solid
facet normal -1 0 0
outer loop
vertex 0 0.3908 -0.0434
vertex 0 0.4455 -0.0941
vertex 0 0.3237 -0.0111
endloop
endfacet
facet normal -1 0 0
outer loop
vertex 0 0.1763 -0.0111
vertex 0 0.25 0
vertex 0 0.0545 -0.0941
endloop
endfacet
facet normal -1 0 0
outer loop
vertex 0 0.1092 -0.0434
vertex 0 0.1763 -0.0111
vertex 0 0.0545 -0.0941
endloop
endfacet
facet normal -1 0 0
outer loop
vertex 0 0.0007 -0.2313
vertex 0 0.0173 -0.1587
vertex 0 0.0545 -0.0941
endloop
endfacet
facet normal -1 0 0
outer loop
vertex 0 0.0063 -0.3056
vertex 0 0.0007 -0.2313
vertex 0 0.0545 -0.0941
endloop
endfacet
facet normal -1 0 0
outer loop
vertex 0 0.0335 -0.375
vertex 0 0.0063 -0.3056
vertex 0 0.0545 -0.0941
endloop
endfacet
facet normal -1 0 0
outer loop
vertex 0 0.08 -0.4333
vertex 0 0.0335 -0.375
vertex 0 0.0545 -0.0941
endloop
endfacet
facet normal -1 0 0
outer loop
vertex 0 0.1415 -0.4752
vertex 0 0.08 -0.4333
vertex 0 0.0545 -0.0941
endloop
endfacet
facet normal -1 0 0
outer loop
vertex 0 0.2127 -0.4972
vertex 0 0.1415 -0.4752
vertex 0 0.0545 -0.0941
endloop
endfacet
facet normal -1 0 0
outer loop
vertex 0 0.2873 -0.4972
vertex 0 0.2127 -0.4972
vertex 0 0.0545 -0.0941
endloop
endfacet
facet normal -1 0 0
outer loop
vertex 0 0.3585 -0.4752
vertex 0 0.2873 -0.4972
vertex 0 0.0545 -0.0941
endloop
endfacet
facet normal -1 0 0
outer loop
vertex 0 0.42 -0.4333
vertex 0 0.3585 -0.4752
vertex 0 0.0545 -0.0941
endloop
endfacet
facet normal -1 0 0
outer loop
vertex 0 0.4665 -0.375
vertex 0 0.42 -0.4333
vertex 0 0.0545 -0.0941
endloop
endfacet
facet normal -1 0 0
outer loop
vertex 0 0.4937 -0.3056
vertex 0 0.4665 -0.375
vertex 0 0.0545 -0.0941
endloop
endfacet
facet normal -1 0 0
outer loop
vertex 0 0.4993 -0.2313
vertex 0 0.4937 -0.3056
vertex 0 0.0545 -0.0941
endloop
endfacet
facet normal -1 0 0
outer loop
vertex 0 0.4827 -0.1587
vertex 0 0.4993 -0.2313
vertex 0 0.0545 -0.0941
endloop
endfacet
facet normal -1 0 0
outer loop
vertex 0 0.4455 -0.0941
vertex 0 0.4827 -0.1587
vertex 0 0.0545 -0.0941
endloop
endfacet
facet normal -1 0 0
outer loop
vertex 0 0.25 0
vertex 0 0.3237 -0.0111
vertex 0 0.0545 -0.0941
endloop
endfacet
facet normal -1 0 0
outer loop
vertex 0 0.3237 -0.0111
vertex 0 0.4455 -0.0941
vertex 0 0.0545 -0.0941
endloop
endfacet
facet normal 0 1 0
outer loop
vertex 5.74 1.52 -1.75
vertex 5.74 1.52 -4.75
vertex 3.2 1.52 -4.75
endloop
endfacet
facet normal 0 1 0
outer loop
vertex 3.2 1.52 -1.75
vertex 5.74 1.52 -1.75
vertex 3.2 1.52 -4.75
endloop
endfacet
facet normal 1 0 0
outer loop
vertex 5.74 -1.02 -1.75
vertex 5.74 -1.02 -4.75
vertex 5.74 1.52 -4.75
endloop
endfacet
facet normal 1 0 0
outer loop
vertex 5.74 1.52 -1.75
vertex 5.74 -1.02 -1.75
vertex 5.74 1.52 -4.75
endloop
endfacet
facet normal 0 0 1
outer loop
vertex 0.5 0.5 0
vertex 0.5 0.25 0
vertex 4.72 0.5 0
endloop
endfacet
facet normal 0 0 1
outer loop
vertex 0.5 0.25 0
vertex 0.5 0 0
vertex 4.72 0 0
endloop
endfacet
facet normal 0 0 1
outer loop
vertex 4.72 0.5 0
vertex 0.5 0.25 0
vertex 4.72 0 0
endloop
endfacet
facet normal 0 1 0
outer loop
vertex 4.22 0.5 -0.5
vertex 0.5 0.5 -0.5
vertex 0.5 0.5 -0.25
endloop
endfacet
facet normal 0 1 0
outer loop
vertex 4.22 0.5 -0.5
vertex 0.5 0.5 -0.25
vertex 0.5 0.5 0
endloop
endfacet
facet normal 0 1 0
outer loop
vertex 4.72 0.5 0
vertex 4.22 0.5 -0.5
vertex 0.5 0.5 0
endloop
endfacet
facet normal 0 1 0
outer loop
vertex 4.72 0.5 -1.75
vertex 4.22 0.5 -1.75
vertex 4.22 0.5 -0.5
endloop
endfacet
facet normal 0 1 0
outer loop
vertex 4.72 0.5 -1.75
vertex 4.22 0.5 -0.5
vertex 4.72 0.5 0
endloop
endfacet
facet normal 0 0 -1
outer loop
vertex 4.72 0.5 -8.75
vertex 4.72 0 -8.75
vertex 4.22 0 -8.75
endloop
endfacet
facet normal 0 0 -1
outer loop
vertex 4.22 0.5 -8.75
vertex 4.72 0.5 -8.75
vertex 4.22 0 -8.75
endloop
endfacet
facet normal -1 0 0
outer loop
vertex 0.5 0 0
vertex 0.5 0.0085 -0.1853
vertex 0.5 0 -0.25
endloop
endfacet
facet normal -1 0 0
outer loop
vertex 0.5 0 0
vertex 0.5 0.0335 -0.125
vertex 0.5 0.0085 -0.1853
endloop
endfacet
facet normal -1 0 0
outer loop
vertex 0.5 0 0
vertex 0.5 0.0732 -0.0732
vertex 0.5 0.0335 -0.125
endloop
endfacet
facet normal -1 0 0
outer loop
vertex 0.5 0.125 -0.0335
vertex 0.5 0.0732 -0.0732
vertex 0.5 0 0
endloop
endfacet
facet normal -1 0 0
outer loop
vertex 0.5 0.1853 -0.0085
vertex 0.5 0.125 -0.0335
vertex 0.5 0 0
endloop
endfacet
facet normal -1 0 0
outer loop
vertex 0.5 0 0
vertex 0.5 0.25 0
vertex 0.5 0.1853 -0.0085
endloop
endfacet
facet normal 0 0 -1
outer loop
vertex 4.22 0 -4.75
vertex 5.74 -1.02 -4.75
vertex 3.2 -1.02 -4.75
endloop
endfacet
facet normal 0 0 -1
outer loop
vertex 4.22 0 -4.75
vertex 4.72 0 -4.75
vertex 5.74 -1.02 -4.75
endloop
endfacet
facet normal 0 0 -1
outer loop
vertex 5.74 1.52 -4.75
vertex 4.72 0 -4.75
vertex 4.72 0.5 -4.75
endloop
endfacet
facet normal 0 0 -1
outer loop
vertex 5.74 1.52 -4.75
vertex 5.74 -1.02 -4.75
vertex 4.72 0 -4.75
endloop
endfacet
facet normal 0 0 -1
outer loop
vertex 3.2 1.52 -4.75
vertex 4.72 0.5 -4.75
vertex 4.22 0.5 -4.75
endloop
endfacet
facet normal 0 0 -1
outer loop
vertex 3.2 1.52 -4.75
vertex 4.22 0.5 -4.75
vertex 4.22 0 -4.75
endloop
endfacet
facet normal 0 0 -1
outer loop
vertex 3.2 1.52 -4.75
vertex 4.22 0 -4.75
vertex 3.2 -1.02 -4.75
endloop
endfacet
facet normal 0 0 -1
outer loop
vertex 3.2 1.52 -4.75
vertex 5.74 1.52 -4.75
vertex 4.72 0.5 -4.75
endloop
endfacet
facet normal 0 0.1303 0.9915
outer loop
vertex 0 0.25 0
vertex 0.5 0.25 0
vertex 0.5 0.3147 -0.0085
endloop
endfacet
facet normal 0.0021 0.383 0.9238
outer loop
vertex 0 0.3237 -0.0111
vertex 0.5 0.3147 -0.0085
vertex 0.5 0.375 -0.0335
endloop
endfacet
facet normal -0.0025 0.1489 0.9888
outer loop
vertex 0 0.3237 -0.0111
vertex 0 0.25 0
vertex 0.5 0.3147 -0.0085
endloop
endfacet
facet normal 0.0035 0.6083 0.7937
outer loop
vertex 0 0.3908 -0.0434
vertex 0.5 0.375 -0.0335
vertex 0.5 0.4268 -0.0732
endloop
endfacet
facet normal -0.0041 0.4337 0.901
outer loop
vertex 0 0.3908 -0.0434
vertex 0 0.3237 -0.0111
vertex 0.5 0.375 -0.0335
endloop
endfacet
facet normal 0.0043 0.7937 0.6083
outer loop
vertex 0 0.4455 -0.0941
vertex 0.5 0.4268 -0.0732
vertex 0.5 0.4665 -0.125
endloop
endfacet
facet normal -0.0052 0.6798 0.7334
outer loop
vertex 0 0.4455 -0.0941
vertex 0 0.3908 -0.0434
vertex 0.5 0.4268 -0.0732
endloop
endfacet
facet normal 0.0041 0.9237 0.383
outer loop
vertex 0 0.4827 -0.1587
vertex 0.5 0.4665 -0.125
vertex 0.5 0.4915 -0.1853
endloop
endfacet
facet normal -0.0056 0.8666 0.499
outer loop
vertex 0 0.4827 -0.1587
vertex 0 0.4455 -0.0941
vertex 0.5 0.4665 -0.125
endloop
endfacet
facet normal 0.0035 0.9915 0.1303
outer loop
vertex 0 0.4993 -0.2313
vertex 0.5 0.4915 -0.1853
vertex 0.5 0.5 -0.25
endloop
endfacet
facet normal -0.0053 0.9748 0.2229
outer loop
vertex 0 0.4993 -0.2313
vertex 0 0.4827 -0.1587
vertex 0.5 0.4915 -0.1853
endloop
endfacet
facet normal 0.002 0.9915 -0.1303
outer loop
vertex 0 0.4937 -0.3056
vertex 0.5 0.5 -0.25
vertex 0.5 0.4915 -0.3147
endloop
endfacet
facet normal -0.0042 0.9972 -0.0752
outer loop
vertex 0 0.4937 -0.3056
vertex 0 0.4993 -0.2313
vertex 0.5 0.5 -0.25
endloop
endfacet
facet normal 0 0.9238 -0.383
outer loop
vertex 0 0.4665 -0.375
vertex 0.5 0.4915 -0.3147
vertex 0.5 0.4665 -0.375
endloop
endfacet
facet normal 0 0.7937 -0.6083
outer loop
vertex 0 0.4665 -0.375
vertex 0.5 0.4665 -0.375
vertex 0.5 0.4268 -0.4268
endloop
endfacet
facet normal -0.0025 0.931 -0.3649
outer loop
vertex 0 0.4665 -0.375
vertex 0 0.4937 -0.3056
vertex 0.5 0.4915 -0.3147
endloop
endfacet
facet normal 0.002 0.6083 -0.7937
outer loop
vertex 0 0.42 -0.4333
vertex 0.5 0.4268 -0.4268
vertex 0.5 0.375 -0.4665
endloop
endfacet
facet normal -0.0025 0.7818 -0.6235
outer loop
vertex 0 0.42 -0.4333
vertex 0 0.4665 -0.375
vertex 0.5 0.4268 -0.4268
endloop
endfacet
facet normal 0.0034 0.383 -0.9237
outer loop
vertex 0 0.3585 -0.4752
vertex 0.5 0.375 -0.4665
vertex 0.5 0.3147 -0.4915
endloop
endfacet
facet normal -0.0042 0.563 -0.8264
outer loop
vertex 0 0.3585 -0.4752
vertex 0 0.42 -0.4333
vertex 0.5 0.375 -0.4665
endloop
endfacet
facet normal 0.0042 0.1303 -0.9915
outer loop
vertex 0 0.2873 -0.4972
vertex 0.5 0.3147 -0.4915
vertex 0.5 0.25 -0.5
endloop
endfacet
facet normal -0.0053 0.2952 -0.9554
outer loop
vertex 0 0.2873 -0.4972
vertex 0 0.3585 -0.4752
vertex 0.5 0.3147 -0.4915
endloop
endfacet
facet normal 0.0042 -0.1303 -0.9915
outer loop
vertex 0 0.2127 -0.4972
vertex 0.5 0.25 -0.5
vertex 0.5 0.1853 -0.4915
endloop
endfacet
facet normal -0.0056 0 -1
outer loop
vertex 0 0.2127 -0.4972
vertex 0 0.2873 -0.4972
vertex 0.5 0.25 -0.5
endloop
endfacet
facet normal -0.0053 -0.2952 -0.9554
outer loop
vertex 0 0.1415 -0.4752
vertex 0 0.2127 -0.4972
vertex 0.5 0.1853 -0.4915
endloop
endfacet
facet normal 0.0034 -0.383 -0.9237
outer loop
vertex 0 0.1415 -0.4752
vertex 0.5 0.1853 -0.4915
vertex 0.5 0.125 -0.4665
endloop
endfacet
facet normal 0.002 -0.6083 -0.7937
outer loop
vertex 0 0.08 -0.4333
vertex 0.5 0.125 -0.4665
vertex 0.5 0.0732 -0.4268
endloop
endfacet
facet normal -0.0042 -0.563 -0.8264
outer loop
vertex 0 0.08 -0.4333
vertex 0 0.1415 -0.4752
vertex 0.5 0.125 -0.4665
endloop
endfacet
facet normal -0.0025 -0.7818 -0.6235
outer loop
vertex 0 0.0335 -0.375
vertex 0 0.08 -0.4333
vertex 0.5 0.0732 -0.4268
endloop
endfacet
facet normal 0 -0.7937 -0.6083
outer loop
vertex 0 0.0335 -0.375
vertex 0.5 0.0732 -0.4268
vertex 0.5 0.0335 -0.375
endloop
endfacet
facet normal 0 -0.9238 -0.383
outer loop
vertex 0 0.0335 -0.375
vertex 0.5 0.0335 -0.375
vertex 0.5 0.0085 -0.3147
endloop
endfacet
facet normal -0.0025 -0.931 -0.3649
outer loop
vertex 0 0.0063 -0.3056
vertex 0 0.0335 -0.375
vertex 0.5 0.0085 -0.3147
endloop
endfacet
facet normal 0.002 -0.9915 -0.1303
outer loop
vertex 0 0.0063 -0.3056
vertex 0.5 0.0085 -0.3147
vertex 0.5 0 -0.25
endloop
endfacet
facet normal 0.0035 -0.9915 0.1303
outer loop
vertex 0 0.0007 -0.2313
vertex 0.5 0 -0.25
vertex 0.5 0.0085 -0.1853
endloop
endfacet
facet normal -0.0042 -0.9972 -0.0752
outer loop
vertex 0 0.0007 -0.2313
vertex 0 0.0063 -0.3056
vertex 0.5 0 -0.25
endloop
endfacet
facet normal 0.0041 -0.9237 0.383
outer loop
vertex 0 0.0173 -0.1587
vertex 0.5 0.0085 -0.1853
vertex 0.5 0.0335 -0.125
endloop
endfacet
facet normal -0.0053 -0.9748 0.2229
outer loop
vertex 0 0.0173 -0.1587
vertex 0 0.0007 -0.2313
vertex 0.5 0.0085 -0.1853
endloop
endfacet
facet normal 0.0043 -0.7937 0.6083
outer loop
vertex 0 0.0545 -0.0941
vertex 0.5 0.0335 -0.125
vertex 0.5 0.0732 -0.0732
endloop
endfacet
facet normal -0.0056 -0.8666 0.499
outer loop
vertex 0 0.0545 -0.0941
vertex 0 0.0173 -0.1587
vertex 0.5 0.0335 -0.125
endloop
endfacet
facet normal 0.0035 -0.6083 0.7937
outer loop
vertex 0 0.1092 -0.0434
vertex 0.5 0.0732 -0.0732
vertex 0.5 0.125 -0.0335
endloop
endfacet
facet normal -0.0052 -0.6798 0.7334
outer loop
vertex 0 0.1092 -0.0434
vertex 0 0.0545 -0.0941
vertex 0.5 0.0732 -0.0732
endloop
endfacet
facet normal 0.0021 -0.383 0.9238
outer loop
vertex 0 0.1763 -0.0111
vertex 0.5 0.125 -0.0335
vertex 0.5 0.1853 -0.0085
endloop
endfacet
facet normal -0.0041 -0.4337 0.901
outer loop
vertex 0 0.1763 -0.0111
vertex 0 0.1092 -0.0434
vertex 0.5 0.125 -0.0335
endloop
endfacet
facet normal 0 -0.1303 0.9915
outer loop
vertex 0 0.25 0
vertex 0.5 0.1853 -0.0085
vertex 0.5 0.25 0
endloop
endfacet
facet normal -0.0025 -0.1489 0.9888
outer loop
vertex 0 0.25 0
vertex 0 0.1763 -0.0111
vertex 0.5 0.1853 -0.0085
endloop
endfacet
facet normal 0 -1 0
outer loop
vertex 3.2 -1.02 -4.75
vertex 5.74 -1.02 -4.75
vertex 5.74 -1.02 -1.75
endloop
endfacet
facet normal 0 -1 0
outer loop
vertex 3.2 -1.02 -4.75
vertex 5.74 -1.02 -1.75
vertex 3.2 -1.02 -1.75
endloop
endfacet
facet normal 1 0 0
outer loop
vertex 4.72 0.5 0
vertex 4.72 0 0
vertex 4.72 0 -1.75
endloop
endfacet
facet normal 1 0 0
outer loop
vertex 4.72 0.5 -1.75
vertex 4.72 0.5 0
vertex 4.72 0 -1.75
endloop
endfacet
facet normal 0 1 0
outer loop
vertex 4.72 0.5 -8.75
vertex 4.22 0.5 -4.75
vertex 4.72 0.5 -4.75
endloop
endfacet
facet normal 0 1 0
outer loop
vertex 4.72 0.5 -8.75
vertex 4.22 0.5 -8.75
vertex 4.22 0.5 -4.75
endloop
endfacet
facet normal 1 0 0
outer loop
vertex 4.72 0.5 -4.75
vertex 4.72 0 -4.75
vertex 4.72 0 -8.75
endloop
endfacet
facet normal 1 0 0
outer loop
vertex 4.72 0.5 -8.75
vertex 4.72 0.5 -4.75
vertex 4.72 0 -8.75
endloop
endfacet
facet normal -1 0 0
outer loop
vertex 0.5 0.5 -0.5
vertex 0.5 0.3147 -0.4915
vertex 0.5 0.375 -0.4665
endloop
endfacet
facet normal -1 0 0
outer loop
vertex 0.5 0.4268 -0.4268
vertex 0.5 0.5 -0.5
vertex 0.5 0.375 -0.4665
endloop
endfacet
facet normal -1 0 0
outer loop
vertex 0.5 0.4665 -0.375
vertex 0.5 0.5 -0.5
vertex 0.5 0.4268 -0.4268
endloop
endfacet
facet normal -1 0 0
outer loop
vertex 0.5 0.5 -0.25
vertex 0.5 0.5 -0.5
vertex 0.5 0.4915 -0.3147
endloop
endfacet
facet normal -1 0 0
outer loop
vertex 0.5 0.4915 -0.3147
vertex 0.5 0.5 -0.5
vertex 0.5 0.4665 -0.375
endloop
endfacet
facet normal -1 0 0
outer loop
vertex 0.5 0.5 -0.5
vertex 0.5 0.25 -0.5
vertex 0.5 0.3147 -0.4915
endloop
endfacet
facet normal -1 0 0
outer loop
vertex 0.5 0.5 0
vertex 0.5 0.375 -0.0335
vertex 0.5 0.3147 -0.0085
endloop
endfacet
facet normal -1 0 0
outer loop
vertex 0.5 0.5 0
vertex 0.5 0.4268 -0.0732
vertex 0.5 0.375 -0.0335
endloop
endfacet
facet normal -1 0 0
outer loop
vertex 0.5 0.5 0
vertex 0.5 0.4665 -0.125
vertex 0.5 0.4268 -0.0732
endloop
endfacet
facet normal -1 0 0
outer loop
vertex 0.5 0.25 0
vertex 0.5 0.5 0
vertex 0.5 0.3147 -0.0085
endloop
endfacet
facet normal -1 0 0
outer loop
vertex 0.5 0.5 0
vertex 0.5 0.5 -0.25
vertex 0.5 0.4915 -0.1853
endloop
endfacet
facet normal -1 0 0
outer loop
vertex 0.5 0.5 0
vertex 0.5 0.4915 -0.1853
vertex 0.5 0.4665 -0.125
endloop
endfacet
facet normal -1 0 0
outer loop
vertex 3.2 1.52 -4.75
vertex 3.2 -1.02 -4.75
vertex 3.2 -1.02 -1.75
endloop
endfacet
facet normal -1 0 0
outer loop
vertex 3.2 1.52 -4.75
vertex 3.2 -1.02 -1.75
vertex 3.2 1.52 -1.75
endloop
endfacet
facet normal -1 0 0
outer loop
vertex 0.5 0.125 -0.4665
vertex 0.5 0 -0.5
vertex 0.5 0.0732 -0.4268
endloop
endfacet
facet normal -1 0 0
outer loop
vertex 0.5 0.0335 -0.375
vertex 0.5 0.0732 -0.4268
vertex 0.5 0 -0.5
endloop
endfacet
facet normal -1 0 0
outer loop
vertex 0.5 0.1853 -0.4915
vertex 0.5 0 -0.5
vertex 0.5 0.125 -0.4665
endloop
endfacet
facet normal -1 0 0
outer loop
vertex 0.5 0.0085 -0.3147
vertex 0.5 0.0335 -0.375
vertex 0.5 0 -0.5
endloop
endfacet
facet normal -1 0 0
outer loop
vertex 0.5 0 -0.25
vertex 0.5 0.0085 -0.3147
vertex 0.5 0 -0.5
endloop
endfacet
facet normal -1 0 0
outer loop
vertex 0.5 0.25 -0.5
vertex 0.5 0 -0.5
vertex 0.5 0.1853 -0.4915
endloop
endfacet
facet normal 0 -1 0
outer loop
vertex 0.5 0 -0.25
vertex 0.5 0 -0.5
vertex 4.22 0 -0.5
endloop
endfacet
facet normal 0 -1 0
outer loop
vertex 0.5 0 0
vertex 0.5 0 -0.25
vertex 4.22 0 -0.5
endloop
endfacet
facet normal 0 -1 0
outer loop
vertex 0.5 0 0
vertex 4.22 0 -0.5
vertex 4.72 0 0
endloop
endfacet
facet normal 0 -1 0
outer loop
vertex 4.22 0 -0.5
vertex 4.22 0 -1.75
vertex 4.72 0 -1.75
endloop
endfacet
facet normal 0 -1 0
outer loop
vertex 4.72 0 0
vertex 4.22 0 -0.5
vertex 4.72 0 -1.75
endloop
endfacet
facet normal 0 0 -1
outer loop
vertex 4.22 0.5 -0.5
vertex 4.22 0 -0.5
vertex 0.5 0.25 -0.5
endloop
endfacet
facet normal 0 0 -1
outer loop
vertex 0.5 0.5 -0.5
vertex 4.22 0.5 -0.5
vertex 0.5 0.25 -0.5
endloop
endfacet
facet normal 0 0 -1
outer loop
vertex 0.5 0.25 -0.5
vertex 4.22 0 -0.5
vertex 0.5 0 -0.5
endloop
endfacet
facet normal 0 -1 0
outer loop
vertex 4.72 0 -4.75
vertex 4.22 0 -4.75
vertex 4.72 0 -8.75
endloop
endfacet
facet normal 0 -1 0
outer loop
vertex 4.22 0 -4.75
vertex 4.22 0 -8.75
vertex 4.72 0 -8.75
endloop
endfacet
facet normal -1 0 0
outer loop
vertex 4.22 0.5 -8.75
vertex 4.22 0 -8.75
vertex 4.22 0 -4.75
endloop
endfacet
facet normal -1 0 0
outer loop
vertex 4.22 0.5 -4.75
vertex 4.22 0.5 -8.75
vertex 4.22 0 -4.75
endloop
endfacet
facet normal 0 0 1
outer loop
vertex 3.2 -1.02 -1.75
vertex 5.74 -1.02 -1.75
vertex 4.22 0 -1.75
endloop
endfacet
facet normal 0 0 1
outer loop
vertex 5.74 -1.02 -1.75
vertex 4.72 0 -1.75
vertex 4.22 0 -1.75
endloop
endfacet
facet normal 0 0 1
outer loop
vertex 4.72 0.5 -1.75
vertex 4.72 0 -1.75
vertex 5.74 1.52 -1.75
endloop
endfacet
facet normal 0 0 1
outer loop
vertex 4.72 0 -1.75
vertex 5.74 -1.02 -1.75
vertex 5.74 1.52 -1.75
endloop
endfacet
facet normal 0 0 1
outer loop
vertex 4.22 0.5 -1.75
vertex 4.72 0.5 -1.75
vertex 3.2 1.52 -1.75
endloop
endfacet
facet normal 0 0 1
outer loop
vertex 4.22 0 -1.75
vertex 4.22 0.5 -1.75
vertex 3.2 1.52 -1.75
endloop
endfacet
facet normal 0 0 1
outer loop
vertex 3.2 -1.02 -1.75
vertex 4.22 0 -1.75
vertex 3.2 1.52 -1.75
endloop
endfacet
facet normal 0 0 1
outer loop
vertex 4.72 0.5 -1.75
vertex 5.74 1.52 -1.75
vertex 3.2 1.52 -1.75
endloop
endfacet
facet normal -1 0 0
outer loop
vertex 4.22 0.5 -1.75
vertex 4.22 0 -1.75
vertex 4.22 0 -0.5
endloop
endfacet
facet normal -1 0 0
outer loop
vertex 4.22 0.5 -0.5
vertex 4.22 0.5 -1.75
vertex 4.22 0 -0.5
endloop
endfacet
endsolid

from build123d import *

# Parameters (mm, degrees)
BOSS_EXTRUDE1_DEPTH = 0.5
SKETCH2_W           = 2.54
SKETCH2_H           = 2.54
BOSS_EXTRUDE2_DEPTH = 3
SKETCH3_OUTSIDE_W   = 12.904
SKETCH3_OUTSIDE_H   = 6.694
SKETCH3_OUTSIDE_R   = 0.25
CUT_EXTRUDE1_DEPTH  = 0.5


with BuildPart() as part:
    # Sketch1 → Boss-Extrude1 (new body)
    with BuildSketch(Plane(origin=(0, 0, 0), x_dir=(1, 0, 0), z_dir=(0, 1, 0))):
        Polygon((0, 0), (4.72, 0), (4.72, 3.649976519), (4.72, 8.75), (4.22, 8.75), (4.22, 0.5), (0, 0.5), align=None)
    extrude(amount=BOSS_EXTRUDE1_DEPTH)

    # Sketch2 → Boss-Extrude2 (add)
    with BuildSketch(Plane(origin=(0, 0, -4.75), x_dir=(-1, 0, 0), z_dir=(0, 0, -1))):
        with Locations((-4.47, 0.25)):
            Rectangle(SKETCH2_W, SKETCH2_H)
    extrude(amount=-BOSS_EXTRUDE2_DEPTH)

    # Sketch3 outside → Cut-Extrude1 (cut)
    with BuildSketch(Plane.ZY):
        with Locations((-4.375, 0.25)):
            Rectangle(SKETCH3_OUTSIDE_W, SKETCH3_OUTSIDE_H)
        with Locations((-0.25, 0.25)):
            Circle(SKETCH3_OUTSIDE_R, mode=Mode.SUBTRACT)
    extrude(amount=-CUT_EXTRUDE1_DEPTH, mode=Mode.SUBTRACT)


solid = part.part
